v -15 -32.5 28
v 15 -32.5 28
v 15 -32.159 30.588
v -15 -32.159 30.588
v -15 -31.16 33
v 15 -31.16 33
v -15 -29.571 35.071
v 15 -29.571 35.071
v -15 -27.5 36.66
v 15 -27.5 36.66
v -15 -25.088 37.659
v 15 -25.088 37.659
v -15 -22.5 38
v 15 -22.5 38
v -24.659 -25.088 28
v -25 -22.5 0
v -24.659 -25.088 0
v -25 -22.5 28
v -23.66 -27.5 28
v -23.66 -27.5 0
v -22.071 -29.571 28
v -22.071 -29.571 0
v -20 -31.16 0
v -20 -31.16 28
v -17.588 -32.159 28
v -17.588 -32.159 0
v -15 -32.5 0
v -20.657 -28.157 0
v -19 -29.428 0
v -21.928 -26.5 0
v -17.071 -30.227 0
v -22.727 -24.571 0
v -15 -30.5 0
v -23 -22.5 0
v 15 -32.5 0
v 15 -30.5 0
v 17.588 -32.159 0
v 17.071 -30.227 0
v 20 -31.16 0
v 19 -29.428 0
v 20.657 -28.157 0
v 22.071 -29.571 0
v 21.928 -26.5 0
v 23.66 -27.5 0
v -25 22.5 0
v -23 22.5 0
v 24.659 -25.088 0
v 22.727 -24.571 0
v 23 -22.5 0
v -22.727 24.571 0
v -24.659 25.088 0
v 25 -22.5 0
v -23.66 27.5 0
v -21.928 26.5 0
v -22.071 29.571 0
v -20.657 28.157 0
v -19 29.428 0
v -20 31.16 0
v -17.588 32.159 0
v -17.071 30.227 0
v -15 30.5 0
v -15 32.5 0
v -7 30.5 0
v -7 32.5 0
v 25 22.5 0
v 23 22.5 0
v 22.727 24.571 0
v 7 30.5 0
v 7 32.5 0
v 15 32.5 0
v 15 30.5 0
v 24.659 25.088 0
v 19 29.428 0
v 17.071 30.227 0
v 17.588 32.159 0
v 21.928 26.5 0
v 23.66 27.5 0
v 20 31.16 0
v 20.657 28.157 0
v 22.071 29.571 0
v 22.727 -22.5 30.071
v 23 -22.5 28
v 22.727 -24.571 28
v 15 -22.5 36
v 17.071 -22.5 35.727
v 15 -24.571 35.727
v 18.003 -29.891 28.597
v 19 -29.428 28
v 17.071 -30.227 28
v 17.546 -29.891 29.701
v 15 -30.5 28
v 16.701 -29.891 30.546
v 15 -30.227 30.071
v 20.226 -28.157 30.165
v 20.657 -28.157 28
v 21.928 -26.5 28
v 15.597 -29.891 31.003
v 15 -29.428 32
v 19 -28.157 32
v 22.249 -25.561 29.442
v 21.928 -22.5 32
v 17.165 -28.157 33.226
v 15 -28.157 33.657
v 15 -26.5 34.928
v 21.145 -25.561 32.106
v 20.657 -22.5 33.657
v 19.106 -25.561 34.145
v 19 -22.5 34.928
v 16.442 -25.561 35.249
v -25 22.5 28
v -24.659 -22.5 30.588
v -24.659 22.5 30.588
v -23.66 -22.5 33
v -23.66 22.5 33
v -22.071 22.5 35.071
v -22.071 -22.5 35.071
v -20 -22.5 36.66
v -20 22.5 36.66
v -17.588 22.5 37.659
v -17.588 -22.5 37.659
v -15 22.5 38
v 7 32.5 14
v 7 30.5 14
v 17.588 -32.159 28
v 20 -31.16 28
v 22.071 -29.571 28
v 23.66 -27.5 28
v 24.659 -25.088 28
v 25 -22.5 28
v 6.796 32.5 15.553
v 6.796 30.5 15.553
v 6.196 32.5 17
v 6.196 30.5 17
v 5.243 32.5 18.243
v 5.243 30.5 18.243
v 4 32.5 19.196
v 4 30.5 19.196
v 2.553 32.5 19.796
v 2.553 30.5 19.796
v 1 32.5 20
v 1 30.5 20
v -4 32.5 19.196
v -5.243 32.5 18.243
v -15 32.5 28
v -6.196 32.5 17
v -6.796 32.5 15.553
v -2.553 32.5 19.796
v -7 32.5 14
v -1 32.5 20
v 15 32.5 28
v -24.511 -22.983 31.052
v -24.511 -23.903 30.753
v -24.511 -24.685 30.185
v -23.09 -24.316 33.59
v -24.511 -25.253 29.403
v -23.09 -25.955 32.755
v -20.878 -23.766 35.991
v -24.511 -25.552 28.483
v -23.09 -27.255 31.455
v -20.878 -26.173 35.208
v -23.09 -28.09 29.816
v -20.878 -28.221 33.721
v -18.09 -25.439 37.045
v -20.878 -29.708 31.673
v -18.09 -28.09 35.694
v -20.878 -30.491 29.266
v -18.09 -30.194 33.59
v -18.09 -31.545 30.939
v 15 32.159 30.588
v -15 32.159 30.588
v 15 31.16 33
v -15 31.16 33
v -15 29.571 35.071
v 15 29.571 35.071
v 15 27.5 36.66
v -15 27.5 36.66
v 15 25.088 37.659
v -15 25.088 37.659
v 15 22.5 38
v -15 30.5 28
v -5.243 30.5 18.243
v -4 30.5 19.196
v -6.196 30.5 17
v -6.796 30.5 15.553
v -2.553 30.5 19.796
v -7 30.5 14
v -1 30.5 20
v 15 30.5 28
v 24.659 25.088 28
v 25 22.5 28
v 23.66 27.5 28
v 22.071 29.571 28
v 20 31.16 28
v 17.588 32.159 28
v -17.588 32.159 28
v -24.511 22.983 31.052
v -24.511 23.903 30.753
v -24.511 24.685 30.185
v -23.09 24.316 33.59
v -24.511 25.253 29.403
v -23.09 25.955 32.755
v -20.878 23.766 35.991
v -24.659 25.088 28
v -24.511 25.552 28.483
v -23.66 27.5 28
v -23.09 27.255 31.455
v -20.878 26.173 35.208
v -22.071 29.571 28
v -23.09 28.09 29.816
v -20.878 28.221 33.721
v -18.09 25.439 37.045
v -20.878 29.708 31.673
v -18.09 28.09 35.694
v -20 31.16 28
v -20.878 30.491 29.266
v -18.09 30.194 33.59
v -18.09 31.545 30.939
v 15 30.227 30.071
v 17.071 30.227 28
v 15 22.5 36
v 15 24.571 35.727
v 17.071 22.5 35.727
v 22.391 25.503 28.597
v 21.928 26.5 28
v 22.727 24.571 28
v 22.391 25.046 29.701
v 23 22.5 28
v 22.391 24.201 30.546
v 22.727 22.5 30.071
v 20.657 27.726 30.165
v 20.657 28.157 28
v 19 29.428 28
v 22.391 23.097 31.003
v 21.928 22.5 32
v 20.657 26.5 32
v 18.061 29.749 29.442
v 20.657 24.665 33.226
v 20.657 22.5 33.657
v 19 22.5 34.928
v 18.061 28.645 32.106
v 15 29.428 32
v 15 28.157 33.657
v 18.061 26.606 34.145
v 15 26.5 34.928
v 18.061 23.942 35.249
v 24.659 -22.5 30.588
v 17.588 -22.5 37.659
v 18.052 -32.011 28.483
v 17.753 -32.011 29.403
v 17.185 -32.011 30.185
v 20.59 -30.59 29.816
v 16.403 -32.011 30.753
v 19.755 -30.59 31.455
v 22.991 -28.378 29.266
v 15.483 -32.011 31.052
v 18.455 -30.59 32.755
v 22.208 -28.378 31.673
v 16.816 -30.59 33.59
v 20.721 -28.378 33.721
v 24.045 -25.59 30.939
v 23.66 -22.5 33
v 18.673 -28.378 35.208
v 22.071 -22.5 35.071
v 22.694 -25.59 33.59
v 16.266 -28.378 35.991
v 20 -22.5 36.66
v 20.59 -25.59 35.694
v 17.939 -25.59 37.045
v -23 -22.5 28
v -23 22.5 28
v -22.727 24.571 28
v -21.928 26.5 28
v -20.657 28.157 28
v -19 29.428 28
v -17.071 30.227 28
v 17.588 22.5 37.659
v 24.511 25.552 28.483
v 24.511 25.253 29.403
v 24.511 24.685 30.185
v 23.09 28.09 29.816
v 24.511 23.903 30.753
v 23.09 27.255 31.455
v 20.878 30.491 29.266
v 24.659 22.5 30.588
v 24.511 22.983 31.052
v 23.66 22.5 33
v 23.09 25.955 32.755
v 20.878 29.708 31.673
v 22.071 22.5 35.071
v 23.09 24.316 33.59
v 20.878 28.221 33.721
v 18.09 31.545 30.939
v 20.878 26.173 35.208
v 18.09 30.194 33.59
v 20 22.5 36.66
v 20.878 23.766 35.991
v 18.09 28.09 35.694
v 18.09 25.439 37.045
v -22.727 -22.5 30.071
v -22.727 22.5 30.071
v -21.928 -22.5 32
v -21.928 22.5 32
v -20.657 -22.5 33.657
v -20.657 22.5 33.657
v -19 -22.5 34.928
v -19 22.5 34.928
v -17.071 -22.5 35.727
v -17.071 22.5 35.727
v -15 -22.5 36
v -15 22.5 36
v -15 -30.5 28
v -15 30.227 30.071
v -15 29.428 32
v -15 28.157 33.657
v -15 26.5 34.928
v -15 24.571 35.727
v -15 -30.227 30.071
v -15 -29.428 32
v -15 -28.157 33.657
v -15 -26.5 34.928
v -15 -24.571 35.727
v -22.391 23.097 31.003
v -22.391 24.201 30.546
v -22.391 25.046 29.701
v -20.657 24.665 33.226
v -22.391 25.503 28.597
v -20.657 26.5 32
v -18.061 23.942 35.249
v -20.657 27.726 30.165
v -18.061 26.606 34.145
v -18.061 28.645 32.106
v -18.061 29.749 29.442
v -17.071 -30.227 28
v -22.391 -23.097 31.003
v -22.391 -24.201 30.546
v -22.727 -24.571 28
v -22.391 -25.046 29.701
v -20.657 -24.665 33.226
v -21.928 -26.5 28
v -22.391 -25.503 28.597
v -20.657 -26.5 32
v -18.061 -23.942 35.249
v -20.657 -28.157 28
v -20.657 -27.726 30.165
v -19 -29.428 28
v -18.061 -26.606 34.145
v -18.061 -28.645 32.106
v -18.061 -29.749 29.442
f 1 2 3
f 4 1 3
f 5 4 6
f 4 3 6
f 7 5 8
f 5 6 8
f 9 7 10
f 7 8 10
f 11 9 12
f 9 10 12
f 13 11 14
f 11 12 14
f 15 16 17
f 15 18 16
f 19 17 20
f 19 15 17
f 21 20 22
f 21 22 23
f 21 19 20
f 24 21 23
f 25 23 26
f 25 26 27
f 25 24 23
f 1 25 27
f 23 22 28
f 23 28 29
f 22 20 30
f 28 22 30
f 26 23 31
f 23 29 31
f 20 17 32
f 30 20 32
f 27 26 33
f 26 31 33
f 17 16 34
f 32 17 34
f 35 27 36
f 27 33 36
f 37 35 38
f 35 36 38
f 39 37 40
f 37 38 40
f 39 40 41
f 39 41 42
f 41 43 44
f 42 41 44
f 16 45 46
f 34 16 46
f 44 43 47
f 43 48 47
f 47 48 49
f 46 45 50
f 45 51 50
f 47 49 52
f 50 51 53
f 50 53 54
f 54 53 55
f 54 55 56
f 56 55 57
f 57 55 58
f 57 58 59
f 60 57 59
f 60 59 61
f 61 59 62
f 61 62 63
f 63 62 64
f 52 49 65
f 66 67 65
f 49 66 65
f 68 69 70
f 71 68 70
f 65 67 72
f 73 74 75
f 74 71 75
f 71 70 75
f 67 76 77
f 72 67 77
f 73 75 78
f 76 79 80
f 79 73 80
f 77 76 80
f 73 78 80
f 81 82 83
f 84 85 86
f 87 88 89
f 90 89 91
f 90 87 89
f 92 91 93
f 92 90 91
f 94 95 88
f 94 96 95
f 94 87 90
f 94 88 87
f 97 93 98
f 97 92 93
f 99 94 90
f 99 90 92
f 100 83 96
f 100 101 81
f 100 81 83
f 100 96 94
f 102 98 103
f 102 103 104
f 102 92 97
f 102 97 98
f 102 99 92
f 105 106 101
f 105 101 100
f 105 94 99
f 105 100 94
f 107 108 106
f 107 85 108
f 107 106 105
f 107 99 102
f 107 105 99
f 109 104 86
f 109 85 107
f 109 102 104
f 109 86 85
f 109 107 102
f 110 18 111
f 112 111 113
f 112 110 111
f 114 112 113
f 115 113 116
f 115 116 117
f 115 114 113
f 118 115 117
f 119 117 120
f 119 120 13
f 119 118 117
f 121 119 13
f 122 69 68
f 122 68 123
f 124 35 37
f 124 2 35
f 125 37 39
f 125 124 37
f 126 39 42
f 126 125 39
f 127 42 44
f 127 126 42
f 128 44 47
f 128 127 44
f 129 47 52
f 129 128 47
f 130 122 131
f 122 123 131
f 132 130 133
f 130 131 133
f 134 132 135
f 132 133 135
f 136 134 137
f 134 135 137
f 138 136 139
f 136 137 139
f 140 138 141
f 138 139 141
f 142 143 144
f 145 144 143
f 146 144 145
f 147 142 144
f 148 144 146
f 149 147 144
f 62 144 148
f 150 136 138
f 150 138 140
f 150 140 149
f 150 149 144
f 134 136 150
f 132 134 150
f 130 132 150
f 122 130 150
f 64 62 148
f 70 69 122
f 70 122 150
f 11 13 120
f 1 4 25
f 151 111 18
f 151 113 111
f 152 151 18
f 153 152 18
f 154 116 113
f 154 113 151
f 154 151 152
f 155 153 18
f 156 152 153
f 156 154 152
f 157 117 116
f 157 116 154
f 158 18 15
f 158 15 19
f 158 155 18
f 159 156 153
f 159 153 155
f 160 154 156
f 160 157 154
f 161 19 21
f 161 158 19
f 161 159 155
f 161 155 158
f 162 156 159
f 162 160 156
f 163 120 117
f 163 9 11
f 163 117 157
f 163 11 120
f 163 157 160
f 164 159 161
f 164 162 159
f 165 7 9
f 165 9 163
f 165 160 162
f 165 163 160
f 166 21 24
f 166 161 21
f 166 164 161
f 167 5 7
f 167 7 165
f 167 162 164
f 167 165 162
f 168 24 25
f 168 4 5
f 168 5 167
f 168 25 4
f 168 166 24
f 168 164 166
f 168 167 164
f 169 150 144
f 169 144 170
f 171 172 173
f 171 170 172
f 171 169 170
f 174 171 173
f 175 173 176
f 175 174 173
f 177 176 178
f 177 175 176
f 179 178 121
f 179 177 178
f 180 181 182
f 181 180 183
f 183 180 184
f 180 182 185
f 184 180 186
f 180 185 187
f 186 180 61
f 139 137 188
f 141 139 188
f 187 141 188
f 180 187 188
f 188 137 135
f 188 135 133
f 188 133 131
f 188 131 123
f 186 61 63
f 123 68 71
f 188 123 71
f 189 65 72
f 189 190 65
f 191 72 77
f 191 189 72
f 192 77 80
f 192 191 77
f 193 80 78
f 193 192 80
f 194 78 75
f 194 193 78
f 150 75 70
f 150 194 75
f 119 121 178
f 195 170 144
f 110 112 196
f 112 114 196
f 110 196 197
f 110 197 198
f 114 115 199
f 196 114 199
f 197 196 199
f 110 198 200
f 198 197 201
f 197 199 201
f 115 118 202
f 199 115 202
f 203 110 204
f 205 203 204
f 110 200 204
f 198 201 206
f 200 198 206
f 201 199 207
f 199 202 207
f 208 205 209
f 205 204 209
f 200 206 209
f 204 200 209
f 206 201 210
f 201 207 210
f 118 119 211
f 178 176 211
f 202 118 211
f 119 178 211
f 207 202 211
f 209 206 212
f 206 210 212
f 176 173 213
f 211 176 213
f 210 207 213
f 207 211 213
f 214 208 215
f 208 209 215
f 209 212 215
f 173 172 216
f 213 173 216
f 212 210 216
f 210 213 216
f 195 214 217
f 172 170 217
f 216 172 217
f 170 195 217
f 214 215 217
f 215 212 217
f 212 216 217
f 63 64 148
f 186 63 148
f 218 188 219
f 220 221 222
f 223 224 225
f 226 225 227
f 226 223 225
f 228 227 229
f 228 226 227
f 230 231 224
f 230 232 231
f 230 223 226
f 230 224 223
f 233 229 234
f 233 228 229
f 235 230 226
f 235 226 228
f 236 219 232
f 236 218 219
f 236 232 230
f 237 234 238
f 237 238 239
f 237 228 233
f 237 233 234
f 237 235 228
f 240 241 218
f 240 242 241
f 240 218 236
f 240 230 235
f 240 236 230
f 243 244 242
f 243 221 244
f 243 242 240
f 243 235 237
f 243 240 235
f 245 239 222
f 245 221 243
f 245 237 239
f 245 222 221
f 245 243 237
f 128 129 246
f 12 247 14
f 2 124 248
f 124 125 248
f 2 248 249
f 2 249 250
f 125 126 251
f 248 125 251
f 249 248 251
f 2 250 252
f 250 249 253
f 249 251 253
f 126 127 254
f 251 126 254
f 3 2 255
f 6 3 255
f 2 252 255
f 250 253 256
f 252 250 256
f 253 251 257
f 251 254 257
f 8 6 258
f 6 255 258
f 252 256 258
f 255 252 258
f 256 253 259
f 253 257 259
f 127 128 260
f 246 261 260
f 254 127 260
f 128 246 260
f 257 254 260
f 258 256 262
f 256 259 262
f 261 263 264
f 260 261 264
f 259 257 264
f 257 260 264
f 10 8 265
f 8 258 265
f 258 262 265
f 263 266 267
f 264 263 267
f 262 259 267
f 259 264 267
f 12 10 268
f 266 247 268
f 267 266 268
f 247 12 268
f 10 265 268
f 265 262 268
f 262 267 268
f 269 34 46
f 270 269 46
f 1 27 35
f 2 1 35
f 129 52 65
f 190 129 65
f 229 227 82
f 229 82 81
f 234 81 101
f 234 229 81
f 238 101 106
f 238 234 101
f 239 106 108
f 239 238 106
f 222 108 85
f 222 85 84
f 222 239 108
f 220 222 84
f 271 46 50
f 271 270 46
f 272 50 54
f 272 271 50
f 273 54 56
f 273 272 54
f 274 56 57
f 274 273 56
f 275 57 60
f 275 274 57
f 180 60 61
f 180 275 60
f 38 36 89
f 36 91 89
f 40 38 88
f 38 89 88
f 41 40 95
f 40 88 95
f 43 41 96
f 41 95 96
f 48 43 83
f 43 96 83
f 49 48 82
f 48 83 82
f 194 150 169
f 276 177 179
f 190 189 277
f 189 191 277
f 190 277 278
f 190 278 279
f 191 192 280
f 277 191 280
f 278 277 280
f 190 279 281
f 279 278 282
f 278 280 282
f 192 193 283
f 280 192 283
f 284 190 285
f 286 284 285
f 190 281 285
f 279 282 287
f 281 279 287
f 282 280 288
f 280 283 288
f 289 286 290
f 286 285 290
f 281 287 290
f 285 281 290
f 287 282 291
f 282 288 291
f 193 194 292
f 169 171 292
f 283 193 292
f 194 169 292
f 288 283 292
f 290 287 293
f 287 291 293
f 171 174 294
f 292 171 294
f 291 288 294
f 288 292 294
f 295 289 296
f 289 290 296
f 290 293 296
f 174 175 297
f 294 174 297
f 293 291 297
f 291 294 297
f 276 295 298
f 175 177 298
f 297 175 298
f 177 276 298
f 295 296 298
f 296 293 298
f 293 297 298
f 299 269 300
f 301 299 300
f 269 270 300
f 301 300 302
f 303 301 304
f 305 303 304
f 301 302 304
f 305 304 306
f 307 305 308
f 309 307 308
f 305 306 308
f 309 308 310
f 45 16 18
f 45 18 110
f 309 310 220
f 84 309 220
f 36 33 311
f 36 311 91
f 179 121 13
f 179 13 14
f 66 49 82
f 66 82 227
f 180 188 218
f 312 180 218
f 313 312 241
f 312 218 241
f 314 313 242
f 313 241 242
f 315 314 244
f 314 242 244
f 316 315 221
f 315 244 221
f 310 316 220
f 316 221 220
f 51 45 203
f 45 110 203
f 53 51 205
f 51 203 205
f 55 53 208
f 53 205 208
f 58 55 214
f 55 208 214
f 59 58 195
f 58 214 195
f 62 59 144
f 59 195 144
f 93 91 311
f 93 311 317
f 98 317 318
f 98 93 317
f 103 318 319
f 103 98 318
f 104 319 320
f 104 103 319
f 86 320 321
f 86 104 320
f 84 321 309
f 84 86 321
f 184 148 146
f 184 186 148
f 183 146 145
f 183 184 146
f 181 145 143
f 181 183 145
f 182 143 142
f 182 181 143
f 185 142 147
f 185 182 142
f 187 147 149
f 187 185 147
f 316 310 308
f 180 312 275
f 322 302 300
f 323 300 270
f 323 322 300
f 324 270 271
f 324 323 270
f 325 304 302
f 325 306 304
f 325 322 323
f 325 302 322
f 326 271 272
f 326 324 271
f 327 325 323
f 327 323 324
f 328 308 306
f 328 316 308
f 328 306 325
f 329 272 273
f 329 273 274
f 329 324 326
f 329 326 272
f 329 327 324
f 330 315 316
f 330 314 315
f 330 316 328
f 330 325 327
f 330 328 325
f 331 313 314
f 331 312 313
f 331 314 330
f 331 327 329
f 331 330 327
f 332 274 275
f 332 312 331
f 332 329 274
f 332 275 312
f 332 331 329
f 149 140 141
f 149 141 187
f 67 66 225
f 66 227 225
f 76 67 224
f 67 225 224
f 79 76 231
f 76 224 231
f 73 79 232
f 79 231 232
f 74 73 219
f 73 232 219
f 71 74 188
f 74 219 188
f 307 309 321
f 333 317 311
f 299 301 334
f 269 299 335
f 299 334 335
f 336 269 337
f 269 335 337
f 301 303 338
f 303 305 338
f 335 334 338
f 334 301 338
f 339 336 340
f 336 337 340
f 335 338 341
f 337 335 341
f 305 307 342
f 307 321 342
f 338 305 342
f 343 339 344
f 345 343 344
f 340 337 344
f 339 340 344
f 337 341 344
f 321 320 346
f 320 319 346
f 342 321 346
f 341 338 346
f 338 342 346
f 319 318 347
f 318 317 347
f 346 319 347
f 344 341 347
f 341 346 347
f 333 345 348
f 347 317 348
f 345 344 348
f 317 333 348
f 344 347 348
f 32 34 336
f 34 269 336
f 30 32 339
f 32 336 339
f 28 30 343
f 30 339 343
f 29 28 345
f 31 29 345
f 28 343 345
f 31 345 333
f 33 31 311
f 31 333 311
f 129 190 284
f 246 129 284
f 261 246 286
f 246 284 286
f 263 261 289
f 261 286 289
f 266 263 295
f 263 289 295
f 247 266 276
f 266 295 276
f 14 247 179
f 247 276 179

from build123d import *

# Parameters (mm, degrees)
F0_W     = 50
F0_H     = 65
F1_DEPTH = 38
F2_R     = 10
F3_T     = -2
F4_W     = 14
F4_H     = 20
F5_DEPTH = 25
F6_R     = 6


with BuildPart() as f1:
    # F0 (on Top) → F1 (new body)
    with BuildSketch(Plane.XY):
        Rectangle(F0_W, F0_H)
    extrude(amount=F1_DEPTH)

    # F2
    f2_edges = [f1.edges().sort_by_distance(p)[0] for p in [
        (0, 32.5, 38),
        (25, 32.5, 19),
        (25, 0, 38),
        (25, -32.5, 19),
        (0, -32.5, 38),
        (-25, 0, 38),
        (-25, 32.5, 19),
        (-25, -32.5, 19),
    ]]
    fillet(f2_edges, radius=F2_R)

    # F3
    f3_openings = [f1.faces().sort_by_distance(p)[0] for p in [
        (0, 0, 0),
    ]]
    offset(amount=F3_T, openings=f3_openings)

    # F4 (on face) → F5 (cut)
    with BuildSketch(Plane(origin=(0, 32.5, 0), x_dir=(-1, 0, 0), z_dir=(0, 1, 0))):
        with Locations((0, 10)):
            Rectangle(F4_W, F4_H)
    extrude(amount=-F5_DEPTH, mode=Mode.SUBTRACT)

    # F6
    f6_edges = [f1.edges().sort_by_distance(p)[0] for p in [
        (7, 31.5, 20),
        (-7, 31.5, 20),
    ]]
    fillet(f6_edges, radius=F6_R)


solid = f1.part
